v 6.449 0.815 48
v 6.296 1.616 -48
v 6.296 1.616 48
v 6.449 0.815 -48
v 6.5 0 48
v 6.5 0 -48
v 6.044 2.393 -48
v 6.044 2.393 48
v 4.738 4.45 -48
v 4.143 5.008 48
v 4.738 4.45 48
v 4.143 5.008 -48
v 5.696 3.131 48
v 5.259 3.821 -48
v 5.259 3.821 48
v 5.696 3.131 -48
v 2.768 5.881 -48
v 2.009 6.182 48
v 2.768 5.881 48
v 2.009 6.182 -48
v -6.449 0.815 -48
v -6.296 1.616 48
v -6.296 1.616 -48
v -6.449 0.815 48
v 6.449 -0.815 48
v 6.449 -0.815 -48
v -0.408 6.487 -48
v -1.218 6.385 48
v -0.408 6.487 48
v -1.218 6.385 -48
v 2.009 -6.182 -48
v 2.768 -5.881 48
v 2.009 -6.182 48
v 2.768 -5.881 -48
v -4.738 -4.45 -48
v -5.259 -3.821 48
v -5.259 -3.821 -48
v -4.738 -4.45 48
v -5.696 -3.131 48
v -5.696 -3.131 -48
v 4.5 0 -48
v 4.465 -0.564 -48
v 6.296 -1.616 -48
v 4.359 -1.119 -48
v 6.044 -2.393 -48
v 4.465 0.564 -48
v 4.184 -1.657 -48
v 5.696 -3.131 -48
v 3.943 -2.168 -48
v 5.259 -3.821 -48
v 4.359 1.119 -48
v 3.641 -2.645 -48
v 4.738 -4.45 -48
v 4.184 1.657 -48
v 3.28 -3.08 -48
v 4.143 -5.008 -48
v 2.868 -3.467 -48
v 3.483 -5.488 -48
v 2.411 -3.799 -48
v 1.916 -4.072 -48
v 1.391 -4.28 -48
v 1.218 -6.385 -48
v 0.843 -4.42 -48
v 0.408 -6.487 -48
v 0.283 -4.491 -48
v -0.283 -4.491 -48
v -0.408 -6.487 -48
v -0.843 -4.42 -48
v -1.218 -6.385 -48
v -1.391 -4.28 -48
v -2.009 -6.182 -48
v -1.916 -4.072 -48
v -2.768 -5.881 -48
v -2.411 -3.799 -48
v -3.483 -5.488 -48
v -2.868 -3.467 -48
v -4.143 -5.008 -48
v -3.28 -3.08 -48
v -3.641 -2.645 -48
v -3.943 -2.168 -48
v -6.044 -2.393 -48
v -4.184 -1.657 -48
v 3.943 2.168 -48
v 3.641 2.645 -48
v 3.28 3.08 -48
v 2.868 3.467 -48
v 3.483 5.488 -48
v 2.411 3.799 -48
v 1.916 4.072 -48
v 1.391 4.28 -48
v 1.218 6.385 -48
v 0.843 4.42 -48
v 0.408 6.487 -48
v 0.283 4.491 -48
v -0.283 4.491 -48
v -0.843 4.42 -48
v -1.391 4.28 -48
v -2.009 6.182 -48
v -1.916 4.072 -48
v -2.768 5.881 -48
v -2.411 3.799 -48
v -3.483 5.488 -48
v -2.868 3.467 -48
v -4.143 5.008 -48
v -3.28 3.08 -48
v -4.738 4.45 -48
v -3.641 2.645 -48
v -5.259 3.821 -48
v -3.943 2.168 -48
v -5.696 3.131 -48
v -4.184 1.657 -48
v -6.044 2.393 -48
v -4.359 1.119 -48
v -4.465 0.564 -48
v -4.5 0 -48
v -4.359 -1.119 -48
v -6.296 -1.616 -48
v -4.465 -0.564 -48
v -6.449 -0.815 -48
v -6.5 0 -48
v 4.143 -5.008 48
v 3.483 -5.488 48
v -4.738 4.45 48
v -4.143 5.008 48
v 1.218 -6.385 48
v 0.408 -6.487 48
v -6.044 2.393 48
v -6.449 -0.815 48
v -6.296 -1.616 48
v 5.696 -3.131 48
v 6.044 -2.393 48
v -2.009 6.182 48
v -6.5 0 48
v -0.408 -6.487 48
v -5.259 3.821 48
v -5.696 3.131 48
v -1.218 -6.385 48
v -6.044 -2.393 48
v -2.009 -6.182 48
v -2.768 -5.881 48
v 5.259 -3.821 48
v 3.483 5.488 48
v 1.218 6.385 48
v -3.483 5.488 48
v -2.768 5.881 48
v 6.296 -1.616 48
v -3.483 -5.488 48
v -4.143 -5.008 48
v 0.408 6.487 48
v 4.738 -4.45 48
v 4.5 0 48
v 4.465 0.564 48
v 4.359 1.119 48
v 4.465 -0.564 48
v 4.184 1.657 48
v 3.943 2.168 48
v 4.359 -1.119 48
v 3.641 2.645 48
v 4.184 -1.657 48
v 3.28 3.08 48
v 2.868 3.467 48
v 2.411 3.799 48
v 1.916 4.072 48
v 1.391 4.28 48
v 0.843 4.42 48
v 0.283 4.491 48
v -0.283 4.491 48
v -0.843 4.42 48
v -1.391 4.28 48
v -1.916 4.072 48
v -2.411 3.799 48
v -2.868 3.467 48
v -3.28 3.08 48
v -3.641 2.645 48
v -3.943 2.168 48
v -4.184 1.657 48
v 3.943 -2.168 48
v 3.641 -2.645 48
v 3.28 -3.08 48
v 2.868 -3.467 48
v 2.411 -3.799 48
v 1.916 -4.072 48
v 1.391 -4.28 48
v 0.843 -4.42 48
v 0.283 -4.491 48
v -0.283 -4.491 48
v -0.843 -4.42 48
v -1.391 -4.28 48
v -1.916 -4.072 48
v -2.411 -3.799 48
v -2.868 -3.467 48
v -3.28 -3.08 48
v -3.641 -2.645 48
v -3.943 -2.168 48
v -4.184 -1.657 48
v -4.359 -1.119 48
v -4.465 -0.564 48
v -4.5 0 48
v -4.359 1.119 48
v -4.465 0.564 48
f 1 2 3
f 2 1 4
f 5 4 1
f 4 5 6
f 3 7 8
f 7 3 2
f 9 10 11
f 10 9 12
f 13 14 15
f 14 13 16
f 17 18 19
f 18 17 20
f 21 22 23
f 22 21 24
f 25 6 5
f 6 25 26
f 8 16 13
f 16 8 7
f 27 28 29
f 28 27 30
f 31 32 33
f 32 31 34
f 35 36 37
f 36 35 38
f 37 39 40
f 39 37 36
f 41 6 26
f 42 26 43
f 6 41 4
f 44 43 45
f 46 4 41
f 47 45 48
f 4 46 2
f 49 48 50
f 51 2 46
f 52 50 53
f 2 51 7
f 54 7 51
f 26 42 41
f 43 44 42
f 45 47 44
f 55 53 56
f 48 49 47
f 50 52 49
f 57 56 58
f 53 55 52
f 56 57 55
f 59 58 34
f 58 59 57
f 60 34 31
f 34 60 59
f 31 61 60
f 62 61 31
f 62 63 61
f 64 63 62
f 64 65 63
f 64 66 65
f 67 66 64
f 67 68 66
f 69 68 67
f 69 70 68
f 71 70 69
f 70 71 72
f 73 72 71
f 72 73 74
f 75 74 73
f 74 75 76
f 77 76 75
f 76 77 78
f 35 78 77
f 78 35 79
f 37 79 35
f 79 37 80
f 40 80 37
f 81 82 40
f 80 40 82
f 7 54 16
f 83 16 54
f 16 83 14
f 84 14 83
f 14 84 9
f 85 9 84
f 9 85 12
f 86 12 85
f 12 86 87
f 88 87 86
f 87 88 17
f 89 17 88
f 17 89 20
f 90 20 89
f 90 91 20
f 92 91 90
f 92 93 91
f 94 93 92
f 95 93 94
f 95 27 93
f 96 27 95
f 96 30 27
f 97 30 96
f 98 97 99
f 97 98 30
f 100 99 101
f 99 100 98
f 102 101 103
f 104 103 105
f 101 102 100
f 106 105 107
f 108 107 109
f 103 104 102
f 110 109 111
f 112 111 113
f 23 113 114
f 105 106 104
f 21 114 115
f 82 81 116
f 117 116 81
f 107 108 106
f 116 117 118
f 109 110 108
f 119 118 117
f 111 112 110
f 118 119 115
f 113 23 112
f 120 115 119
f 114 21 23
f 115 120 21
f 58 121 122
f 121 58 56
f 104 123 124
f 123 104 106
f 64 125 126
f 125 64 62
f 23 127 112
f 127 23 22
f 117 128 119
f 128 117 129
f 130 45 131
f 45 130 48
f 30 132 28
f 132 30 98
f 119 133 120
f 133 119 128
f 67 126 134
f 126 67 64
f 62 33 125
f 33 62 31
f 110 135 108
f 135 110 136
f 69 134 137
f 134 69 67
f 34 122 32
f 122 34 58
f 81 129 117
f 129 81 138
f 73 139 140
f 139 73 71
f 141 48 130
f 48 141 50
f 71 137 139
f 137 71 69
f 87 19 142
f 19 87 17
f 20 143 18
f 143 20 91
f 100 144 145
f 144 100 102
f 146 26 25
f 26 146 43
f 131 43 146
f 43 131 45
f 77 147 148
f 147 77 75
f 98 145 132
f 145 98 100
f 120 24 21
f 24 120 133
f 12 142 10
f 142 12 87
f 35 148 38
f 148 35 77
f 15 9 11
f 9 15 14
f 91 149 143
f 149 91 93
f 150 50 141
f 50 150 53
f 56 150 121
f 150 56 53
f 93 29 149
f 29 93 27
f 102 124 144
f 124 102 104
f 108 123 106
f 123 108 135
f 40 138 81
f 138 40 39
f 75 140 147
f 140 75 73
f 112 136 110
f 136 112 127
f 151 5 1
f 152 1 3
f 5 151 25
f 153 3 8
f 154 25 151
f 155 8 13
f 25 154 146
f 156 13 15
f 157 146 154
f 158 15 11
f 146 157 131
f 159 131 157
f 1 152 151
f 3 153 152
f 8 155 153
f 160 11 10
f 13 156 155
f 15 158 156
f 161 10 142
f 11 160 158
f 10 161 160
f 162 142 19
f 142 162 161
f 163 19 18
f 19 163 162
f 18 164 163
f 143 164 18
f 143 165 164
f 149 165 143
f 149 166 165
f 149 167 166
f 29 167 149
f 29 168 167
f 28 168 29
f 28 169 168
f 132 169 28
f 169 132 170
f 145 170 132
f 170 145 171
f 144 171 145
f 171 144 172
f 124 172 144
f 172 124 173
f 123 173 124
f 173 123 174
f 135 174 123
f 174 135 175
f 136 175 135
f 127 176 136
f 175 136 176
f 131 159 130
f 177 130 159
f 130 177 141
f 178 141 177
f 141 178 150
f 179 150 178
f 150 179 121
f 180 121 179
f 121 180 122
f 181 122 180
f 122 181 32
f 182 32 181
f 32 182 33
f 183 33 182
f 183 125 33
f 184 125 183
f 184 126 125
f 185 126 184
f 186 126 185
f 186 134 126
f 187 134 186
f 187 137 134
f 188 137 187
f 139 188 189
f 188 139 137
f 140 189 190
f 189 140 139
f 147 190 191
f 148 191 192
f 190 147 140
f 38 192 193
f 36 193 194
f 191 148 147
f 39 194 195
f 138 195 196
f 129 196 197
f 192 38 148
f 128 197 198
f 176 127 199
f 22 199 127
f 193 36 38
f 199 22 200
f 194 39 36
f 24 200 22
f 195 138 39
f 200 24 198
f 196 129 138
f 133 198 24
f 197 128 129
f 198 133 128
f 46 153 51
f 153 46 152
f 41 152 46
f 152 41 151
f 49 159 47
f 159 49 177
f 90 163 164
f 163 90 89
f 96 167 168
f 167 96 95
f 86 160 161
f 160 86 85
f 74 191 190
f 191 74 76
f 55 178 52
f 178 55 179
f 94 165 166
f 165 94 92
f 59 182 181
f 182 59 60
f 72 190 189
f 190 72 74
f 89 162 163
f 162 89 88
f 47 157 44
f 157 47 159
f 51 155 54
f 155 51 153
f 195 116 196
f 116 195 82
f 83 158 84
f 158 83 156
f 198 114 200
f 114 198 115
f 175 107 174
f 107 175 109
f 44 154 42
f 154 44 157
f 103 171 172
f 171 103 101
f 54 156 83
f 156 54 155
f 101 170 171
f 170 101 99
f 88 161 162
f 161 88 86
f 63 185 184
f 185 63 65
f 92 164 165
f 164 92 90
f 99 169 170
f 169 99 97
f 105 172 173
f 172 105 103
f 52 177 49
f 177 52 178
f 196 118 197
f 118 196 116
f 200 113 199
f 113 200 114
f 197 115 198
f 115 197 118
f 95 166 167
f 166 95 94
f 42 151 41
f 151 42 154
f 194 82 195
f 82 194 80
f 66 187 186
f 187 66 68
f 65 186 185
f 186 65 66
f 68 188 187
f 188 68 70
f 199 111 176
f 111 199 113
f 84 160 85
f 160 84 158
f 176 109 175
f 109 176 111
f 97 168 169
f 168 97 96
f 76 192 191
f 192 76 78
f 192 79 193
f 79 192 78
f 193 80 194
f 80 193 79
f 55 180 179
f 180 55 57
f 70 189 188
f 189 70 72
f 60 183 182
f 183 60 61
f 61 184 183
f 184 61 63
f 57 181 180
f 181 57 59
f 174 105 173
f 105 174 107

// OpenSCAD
$fn = 50;


difference() {
	union() {
		translate(v = [0, 0, -48.0000000000]) {
			cylinder(h = 96, r = 6.5000000000);
		}
	}
	union() {
		translate(v = [0, 0, -100.0000000000]) {
			cylinder(h = 200, r = 4.5000000000);
		}
	}
}
